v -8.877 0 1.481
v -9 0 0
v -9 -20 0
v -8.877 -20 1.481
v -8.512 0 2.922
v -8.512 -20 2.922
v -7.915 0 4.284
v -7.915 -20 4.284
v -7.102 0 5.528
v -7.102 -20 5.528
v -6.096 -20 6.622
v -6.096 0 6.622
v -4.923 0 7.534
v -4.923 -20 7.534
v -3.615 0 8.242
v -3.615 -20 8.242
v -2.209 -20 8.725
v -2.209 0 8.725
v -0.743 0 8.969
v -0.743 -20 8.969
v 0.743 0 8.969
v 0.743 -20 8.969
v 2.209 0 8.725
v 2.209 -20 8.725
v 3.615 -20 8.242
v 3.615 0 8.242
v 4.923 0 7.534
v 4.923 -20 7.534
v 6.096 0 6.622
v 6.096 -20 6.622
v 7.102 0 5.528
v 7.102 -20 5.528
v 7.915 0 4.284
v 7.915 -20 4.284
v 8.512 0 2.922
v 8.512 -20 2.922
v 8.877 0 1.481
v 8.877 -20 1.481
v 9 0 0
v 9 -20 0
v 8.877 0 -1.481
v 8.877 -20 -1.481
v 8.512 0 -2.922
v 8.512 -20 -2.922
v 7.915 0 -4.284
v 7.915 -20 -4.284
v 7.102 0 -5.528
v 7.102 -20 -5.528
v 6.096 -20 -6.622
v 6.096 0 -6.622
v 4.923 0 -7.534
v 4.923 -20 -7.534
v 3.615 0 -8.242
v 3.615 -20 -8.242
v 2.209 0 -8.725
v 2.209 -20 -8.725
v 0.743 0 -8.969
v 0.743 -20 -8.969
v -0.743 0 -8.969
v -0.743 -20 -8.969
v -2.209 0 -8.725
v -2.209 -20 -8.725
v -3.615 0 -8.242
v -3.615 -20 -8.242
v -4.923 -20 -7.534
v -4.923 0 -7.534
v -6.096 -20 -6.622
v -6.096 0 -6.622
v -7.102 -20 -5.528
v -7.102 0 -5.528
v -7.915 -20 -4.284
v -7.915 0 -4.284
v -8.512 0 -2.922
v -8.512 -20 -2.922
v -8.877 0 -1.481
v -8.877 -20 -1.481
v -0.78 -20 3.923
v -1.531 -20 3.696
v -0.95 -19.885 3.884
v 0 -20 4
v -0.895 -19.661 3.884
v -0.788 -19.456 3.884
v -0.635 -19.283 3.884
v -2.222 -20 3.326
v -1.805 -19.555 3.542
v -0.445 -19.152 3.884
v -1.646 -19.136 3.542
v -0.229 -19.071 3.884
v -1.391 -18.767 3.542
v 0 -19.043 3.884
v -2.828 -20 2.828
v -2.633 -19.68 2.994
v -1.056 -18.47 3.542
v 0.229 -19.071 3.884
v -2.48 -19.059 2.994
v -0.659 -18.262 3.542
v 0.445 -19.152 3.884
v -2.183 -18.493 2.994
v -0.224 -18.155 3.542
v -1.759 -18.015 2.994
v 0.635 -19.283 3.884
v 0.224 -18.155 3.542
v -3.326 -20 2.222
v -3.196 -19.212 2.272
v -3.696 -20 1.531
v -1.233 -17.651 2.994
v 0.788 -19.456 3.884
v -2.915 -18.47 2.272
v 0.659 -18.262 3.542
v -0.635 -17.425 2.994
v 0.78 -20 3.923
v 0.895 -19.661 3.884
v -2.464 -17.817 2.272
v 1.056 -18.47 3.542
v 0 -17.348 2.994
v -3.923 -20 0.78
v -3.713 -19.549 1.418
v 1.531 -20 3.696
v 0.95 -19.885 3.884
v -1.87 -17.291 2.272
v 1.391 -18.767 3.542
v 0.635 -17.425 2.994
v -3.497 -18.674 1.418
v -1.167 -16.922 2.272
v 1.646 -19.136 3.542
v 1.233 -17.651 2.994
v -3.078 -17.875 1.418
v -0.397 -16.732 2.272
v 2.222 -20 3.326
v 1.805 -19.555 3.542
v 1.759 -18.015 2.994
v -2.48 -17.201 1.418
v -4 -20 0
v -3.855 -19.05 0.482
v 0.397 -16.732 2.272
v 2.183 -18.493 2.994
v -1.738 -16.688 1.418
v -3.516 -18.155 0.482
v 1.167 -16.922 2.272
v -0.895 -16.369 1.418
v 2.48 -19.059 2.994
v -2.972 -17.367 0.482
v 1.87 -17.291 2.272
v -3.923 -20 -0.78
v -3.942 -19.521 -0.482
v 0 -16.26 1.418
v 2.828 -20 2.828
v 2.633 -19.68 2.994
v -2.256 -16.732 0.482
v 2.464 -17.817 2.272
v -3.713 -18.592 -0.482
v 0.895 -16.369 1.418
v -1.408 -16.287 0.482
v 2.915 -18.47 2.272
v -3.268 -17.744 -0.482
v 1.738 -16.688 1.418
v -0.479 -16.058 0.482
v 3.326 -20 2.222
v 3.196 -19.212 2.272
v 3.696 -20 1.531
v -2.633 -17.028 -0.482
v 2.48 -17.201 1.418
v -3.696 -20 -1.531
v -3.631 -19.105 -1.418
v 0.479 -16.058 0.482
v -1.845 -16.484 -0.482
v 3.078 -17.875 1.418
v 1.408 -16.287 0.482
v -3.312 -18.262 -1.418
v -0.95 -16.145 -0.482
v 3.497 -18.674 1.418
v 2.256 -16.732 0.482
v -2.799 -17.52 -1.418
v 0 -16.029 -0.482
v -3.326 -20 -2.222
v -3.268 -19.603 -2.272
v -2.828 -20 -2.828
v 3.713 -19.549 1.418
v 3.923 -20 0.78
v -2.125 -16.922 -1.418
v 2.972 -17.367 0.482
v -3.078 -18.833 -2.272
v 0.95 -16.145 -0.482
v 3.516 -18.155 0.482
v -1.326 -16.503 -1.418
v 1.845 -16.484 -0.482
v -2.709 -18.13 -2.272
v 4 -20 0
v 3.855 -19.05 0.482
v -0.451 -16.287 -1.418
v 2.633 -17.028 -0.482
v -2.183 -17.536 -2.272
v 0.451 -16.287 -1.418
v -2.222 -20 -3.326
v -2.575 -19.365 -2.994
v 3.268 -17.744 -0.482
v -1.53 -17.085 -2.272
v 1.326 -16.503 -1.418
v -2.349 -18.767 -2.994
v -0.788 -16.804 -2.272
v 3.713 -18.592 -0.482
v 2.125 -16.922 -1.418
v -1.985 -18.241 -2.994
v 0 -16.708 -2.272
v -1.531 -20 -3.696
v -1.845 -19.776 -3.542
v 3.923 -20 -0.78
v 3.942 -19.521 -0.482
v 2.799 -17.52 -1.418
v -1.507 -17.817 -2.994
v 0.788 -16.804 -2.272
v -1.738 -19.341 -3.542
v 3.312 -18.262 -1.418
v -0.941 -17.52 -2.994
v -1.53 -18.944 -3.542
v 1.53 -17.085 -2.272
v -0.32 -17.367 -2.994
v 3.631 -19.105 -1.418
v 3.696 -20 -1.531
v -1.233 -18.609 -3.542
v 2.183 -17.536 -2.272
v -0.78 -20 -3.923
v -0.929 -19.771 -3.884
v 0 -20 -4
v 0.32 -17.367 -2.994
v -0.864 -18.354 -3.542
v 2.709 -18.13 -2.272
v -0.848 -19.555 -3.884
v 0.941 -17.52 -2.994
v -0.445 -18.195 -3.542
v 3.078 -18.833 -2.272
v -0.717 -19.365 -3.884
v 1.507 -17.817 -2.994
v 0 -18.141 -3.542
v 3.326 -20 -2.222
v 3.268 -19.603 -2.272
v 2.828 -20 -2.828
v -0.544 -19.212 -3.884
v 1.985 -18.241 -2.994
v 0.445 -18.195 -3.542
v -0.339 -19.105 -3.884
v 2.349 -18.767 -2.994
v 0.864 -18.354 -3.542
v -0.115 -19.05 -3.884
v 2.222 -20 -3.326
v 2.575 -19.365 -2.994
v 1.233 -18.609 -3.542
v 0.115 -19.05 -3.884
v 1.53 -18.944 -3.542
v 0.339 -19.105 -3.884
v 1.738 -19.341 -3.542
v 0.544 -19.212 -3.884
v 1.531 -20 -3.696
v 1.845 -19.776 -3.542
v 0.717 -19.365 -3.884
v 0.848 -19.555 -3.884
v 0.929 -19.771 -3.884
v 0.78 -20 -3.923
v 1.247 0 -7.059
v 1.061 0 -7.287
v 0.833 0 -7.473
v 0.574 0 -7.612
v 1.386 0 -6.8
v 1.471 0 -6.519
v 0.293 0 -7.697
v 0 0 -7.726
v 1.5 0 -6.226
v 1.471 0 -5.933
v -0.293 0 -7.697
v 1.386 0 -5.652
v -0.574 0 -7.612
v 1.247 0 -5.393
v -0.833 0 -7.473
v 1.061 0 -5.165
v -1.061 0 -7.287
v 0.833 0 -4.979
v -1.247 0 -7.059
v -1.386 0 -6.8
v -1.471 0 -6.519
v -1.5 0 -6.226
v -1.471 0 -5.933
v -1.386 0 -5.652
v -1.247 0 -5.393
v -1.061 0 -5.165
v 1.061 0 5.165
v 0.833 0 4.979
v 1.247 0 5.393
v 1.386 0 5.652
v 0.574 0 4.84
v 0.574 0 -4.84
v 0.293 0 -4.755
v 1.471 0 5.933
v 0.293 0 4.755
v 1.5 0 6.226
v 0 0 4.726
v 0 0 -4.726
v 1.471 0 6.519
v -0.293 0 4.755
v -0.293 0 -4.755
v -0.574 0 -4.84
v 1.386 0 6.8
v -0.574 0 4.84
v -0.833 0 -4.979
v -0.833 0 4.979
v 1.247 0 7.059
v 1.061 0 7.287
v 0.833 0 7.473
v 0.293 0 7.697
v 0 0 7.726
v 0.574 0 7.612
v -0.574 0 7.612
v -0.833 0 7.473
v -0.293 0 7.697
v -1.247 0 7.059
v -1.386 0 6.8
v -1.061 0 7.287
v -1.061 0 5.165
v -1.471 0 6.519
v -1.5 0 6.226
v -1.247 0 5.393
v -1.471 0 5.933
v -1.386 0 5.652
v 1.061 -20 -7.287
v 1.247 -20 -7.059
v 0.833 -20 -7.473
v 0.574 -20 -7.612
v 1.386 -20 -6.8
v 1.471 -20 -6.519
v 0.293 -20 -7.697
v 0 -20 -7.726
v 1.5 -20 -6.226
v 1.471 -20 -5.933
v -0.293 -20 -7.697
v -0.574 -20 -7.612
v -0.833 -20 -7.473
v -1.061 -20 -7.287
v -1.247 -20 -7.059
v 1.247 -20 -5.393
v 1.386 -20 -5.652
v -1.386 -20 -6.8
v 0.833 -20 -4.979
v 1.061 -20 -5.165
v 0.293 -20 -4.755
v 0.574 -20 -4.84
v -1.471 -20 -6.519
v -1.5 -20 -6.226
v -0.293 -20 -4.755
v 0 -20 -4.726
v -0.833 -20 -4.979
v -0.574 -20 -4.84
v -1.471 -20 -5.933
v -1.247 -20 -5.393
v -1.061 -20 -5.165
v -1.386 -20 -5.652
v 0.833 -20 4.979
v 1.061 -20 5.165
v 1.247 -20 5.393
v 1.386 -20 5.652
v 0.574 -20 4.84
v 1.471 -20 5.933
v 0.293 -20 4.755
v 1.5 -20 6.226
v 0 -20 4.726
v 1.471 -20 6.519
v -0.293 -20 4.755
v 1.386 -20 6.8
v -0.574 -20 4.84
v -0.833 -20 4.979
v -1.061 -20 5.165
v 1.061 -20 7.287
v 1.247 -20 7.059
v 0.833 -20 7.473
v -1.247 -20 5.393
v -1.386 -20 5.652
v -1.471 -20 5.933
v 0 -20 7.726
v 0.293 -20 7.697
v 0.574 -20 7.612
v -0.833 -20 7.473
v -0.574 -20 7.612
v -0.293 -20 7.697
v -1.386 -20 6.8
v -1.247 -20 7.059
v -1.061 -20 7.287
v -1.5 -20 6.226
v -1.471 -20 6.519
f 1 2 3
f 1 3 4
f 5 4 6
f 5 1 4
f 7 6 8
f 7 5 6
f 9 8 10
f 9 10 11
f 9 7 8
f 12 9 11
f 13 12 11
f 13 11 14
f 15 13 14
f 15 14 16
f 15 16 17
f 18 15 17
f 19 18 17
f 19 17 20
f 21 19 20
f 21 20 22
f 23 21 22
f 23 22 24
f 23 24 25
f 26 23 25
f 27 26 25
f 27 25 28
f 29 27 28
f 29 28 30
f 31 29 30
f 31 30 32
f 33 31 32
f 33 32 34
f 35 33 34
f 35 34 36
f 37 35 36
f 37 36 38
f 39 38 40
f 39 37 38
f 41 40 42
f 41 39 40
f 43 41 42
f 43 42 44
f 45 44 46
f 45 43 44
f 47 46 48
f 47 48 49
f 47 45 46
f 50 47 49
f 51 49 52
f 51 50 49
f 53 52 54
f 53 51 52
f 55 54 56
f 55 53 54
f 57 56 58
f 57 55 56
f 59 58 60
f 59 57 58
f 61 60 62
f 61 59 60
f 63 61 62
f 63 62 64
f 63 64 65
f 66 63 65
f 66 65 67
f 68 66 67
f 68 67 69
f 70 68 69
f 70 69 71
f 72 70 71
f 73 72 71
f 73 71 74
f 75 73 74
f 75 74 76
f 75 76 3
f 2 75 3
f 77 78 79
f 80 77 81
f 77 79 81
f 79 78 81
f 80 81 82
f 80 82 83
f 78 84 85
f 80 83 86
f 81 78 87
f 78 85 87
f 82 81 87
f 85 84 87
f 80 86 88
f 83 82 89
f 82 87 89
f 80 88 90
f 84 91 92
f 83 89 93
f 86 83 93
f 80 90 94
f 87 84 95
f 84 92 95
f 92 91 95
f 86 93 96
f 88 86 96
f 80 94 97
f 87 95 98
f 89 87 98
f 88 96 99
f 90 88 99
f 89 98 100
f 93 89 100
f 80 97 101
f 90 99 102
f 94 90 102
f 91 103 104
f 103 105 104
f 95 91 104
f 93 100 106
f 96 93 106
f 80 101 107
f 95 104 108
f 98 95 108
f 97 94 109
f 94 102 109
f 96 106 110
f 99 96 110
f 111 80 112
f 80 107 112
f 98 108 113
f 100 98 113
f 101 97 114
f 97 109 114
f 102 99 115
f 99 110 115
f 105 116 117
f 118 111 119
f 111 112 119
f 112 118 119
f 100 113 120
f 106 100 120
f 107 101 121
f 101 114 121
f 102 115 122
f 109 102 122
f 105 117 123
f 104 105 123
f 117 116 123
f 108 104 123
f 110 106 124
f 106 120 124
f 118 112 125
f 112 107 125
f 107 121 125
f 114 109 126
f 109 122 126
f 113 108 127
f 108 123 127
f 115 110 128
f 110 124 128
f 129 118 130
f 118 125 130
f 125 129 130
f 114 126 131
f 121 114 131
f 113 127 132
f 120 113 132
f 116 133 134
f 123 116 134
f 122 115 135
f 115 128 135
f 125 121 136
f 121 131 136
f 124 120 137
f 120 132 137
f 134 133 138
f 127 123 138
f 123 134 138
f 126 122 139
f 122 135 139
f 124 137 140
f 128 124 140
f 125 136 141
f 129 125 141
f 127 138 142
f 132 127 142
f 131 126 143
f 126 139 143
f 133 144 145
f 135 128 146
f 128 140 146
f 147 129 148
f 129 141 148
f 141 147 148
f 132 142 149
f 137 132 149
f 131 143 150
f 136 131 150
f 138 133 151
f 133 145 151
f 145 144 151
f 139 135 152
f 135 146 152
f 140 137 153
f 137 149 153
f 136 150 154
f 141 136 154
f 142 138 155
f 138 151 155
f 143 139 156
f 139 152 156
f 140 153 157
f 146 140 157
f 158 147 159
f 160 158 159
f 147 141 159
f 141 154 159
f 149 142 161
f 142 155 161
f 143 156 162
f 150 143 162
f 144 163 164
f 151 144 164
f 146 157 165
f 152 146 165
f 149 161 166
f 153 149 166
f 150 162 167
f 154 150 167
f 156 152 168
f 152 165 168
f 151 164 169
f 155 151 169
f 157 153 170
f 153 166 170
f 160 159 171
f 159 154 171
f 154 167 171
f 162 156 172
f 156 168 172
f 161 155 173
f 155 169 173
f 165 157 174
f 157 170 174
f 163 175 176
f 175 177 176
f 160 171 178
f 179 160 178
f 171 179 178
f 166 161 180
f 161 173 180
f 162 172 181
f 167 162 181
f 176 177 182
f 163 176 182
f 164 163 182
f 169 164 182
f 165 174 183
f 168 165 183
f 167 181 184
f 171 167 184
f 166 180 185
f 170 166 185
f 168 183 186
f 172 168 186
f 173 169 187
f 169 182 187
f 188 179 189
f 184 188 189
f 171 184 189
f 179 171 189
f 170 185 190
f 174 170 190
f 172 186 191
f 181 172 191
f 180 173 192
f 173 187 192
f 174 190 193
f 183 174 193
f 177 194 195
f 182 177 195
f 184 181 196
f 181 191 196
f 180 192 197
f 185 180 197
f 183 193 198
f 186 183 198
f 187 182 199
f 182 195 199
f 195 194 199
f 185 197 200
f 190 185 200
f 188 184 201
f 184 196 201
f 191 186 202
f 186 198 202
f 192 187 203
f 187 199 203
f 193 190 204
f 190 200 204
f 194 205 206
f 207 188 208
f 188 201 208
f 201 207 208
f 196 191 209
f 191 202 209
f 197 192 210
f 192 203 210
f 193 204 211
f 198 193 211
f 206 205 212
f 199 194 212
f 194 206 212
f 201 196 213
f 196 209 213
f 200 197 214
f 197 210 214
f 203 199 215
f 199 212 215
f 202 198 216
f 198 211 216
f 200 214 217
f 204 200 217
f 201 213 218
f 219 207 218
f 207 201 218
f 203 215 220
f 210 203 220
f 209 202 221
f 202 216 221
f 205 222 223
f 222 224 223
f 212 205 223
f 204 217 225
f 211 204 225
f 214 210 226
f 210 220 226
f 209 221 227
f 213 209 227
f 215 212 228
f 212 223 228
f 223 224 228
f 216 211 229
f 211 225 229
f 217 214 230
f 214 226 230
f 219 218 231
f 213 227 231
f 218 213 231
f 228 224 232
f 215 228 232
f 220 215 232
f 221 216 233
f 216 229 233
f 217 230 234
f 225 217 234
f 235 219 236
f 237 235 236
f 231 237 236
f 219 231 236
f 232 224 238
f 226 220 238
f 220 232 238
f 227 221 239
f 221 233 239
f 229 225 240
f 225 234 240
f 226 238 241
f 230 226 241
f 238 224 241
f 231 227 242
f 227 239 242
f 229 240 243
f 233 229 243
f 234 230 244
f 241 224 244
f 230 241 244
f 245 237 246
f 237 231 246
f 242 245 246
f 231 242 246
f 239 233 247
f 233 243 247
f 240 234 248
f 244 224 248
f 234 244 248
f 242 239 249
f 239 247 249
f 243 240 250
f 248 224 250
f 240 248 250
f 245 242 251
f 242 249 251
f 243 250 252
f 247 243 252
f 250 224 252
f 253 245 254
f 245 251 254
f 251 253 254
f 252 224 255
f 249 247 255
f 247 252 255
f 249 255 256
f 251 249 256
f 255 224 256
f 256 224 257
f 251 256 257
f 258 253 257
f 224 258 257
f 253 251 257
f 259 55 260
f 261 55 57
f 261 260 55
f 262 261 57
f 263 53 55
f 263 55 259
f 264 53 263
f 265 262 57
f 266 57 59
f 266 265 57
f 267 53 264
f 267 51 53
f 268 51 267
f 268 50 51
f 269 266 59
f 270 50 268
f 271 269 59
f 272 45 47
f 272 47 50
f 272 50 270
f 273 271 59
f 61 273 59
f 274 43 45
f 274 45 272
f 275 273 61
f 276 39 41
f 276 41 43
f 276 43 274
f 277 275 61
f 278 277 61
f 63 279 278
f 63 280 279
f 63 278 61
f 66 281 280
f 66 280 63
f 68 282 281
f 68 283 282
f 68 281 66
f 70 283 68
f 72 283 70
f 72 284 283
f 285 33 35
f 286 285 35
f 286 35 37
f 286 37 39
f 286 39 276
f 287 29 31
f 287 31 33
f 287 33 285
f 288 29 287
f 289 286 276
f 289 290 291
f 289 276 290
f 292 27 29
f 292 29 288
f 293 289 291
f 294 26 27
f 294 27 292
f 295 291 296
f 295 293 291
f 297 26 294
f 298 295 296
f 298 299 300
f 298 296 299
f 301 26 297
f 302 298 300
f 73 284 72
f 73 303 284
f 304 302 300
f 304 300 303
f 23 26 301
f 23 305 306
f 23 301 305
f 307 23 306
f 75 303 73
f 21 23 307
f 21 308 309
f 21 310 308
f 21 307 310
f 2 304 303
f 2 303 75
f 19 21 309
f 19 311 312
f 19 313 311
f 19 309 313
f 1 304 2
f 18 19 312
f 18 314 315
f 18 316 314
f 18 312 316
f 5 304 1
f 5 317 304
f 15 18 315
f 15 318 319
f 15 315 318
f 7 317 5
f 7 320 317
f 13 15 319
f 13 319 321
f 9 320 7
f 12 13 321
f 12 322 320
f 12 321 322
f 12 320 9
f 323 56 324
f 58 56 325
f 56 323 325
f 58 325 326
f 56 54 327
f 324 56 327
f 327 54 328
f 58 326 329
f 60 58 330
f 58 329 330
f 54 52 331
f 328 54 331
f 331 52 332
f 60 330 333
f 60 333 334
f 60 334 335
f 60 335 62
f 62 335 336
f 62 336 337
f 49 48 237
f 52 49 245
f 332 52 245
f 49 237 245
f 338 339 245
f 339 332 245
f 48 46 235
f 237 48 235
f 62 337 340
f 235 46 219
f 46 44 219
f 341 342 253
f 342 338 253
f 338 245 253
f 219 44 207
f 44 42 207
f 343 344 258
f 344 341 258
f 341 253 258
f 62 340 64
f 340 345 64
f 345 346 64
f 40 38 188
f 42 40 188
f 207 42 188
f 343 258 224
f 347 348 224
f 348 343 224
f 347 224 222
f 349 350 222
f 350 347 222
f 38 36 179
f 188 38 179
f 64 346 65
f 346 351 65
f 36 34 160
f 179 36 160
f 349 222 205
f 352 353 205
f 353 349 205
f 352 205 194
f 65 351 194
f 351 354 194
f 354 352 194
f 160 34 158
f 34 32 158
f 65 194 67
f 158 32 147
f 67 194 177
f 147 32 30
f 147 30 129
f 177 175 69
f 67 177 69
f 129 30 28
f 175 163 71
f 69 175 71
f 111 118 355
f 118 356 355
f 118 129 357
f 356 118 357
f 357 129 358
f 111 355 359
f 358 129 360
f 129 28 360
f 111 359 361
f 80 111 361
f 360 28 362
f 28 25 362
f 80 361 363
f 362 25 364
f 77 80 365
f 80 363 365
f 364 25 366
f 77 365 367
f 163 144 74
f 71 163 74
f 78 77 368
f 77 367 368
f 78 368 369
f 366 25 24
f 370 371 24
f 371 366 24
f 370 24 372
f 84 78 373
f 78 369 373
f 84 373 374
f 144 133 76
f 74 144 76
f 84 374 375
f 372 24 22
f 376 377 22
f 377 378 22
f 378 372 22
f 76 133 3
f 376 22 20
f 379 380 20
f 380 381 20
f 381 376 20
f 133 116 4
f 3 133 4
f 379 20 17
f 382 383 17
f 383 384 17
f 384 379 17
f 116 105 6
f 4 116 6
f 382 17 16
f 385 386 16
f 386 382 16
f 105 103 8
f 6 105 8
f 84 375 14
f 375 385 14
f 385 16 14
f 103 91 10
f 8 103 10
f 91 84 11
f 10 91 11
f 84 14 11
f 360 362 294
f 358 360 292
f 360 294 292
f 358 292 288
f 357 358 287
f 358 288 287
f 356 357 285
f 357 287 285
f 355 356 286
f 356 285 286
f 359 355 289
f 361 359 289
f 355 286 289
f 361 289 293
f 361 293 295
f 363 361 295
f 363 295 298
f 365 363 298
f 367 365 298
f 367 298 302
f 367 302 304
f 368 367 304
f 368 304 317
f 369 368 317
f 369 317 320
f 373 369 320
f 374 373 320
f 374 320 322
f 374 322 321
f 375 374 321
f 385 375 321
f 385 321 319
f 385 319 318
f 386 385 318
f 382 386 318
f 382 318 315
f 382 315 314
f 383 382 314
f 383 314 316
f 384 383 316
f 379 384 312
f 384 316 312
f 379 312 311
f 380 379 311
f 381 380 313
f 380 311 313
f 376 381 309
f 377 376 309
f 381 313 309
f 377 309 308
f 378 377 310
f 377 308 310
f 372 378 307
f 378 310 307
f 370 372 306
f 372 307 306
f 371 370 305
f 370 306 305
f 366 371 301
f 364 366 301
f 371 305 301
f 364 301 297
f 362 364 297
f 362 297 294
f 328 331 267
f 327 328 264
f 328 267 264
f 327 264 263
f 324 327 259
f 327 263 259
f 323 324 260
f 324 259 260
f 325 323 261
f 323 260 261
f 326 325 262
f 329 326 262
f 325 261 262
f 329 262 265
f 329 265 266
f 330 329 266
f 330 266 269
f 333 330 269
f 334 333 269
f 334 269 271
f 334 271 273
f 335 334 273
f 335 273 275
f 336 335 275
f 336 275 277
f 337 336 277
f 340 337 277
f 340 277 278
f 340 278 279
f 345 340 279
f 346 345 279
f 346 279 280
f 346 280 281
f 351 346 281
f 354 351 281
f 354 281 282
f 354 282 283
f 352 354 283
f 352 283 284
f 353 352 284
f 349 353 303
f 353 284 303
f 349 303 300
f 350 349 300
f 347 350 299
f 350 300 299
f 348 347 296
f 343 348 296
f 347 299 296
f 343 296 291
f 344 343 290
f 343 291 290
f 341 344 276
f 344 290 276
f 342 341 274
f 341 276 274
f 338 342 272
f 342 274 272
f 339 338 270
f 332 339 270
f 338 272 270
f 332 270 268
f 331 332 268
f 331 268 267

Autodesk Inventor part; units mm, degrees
ref_plane "YZ Plane" through (0, 0, 0) normal (1, 0, 0) x (0, 1, 0)
ref_plane "XZ Plane" through (0, 0, 0) normal (0, 1, 0) x (-1, 0, 0)
ref_plane "XY Plane" through (0, 0, 0) normal (0, 0, 1) x (1, 0, 0)
sketch "Boceto1" plane through (0, 0, 0) normal (0, 1, 0) x (-1, 0, 0)
  circle A0 centre (0, 0) radius 9
  dimension "d0" = 18
extrude "Extrusión1" add sketch "Boceto1" against normal blind 20
sketch "Boceto3" plane through (0, 0, 0) normal (0, 1, 0) x (1, 0, 0)
  point P0 (0, 0)
sketch "Boceto4" plane through (0, 0, 0) normal (0, 1, 0) x (1, 0, 0)
  circle A0 centre (0, -6.226) radius 1.5
  circle A1 centre (0, 6.226) radius 1.5
  point P0 (0, 0)
  dimension "d6" = 3
  dimension "d7" = 3
extrude "Extrusión2" cut sketch "Boceto4" against normal blind 20
sketch "Boceto5" plane through (0, -20, 0) normal (0, -1, 0) x (1, 0, 0)
  arc A0 (0, 4) -> (0, -4) centre (0, 0) ccw
  line L0 (0, 4) -> (0, -4)
  dimension "d12" = 8
revolve "Revolución3" cut sketch "Boceto5" angle 360 about axis through (0, -20, 4) along (0, 0, -1)
properties part number "rueda loca"
